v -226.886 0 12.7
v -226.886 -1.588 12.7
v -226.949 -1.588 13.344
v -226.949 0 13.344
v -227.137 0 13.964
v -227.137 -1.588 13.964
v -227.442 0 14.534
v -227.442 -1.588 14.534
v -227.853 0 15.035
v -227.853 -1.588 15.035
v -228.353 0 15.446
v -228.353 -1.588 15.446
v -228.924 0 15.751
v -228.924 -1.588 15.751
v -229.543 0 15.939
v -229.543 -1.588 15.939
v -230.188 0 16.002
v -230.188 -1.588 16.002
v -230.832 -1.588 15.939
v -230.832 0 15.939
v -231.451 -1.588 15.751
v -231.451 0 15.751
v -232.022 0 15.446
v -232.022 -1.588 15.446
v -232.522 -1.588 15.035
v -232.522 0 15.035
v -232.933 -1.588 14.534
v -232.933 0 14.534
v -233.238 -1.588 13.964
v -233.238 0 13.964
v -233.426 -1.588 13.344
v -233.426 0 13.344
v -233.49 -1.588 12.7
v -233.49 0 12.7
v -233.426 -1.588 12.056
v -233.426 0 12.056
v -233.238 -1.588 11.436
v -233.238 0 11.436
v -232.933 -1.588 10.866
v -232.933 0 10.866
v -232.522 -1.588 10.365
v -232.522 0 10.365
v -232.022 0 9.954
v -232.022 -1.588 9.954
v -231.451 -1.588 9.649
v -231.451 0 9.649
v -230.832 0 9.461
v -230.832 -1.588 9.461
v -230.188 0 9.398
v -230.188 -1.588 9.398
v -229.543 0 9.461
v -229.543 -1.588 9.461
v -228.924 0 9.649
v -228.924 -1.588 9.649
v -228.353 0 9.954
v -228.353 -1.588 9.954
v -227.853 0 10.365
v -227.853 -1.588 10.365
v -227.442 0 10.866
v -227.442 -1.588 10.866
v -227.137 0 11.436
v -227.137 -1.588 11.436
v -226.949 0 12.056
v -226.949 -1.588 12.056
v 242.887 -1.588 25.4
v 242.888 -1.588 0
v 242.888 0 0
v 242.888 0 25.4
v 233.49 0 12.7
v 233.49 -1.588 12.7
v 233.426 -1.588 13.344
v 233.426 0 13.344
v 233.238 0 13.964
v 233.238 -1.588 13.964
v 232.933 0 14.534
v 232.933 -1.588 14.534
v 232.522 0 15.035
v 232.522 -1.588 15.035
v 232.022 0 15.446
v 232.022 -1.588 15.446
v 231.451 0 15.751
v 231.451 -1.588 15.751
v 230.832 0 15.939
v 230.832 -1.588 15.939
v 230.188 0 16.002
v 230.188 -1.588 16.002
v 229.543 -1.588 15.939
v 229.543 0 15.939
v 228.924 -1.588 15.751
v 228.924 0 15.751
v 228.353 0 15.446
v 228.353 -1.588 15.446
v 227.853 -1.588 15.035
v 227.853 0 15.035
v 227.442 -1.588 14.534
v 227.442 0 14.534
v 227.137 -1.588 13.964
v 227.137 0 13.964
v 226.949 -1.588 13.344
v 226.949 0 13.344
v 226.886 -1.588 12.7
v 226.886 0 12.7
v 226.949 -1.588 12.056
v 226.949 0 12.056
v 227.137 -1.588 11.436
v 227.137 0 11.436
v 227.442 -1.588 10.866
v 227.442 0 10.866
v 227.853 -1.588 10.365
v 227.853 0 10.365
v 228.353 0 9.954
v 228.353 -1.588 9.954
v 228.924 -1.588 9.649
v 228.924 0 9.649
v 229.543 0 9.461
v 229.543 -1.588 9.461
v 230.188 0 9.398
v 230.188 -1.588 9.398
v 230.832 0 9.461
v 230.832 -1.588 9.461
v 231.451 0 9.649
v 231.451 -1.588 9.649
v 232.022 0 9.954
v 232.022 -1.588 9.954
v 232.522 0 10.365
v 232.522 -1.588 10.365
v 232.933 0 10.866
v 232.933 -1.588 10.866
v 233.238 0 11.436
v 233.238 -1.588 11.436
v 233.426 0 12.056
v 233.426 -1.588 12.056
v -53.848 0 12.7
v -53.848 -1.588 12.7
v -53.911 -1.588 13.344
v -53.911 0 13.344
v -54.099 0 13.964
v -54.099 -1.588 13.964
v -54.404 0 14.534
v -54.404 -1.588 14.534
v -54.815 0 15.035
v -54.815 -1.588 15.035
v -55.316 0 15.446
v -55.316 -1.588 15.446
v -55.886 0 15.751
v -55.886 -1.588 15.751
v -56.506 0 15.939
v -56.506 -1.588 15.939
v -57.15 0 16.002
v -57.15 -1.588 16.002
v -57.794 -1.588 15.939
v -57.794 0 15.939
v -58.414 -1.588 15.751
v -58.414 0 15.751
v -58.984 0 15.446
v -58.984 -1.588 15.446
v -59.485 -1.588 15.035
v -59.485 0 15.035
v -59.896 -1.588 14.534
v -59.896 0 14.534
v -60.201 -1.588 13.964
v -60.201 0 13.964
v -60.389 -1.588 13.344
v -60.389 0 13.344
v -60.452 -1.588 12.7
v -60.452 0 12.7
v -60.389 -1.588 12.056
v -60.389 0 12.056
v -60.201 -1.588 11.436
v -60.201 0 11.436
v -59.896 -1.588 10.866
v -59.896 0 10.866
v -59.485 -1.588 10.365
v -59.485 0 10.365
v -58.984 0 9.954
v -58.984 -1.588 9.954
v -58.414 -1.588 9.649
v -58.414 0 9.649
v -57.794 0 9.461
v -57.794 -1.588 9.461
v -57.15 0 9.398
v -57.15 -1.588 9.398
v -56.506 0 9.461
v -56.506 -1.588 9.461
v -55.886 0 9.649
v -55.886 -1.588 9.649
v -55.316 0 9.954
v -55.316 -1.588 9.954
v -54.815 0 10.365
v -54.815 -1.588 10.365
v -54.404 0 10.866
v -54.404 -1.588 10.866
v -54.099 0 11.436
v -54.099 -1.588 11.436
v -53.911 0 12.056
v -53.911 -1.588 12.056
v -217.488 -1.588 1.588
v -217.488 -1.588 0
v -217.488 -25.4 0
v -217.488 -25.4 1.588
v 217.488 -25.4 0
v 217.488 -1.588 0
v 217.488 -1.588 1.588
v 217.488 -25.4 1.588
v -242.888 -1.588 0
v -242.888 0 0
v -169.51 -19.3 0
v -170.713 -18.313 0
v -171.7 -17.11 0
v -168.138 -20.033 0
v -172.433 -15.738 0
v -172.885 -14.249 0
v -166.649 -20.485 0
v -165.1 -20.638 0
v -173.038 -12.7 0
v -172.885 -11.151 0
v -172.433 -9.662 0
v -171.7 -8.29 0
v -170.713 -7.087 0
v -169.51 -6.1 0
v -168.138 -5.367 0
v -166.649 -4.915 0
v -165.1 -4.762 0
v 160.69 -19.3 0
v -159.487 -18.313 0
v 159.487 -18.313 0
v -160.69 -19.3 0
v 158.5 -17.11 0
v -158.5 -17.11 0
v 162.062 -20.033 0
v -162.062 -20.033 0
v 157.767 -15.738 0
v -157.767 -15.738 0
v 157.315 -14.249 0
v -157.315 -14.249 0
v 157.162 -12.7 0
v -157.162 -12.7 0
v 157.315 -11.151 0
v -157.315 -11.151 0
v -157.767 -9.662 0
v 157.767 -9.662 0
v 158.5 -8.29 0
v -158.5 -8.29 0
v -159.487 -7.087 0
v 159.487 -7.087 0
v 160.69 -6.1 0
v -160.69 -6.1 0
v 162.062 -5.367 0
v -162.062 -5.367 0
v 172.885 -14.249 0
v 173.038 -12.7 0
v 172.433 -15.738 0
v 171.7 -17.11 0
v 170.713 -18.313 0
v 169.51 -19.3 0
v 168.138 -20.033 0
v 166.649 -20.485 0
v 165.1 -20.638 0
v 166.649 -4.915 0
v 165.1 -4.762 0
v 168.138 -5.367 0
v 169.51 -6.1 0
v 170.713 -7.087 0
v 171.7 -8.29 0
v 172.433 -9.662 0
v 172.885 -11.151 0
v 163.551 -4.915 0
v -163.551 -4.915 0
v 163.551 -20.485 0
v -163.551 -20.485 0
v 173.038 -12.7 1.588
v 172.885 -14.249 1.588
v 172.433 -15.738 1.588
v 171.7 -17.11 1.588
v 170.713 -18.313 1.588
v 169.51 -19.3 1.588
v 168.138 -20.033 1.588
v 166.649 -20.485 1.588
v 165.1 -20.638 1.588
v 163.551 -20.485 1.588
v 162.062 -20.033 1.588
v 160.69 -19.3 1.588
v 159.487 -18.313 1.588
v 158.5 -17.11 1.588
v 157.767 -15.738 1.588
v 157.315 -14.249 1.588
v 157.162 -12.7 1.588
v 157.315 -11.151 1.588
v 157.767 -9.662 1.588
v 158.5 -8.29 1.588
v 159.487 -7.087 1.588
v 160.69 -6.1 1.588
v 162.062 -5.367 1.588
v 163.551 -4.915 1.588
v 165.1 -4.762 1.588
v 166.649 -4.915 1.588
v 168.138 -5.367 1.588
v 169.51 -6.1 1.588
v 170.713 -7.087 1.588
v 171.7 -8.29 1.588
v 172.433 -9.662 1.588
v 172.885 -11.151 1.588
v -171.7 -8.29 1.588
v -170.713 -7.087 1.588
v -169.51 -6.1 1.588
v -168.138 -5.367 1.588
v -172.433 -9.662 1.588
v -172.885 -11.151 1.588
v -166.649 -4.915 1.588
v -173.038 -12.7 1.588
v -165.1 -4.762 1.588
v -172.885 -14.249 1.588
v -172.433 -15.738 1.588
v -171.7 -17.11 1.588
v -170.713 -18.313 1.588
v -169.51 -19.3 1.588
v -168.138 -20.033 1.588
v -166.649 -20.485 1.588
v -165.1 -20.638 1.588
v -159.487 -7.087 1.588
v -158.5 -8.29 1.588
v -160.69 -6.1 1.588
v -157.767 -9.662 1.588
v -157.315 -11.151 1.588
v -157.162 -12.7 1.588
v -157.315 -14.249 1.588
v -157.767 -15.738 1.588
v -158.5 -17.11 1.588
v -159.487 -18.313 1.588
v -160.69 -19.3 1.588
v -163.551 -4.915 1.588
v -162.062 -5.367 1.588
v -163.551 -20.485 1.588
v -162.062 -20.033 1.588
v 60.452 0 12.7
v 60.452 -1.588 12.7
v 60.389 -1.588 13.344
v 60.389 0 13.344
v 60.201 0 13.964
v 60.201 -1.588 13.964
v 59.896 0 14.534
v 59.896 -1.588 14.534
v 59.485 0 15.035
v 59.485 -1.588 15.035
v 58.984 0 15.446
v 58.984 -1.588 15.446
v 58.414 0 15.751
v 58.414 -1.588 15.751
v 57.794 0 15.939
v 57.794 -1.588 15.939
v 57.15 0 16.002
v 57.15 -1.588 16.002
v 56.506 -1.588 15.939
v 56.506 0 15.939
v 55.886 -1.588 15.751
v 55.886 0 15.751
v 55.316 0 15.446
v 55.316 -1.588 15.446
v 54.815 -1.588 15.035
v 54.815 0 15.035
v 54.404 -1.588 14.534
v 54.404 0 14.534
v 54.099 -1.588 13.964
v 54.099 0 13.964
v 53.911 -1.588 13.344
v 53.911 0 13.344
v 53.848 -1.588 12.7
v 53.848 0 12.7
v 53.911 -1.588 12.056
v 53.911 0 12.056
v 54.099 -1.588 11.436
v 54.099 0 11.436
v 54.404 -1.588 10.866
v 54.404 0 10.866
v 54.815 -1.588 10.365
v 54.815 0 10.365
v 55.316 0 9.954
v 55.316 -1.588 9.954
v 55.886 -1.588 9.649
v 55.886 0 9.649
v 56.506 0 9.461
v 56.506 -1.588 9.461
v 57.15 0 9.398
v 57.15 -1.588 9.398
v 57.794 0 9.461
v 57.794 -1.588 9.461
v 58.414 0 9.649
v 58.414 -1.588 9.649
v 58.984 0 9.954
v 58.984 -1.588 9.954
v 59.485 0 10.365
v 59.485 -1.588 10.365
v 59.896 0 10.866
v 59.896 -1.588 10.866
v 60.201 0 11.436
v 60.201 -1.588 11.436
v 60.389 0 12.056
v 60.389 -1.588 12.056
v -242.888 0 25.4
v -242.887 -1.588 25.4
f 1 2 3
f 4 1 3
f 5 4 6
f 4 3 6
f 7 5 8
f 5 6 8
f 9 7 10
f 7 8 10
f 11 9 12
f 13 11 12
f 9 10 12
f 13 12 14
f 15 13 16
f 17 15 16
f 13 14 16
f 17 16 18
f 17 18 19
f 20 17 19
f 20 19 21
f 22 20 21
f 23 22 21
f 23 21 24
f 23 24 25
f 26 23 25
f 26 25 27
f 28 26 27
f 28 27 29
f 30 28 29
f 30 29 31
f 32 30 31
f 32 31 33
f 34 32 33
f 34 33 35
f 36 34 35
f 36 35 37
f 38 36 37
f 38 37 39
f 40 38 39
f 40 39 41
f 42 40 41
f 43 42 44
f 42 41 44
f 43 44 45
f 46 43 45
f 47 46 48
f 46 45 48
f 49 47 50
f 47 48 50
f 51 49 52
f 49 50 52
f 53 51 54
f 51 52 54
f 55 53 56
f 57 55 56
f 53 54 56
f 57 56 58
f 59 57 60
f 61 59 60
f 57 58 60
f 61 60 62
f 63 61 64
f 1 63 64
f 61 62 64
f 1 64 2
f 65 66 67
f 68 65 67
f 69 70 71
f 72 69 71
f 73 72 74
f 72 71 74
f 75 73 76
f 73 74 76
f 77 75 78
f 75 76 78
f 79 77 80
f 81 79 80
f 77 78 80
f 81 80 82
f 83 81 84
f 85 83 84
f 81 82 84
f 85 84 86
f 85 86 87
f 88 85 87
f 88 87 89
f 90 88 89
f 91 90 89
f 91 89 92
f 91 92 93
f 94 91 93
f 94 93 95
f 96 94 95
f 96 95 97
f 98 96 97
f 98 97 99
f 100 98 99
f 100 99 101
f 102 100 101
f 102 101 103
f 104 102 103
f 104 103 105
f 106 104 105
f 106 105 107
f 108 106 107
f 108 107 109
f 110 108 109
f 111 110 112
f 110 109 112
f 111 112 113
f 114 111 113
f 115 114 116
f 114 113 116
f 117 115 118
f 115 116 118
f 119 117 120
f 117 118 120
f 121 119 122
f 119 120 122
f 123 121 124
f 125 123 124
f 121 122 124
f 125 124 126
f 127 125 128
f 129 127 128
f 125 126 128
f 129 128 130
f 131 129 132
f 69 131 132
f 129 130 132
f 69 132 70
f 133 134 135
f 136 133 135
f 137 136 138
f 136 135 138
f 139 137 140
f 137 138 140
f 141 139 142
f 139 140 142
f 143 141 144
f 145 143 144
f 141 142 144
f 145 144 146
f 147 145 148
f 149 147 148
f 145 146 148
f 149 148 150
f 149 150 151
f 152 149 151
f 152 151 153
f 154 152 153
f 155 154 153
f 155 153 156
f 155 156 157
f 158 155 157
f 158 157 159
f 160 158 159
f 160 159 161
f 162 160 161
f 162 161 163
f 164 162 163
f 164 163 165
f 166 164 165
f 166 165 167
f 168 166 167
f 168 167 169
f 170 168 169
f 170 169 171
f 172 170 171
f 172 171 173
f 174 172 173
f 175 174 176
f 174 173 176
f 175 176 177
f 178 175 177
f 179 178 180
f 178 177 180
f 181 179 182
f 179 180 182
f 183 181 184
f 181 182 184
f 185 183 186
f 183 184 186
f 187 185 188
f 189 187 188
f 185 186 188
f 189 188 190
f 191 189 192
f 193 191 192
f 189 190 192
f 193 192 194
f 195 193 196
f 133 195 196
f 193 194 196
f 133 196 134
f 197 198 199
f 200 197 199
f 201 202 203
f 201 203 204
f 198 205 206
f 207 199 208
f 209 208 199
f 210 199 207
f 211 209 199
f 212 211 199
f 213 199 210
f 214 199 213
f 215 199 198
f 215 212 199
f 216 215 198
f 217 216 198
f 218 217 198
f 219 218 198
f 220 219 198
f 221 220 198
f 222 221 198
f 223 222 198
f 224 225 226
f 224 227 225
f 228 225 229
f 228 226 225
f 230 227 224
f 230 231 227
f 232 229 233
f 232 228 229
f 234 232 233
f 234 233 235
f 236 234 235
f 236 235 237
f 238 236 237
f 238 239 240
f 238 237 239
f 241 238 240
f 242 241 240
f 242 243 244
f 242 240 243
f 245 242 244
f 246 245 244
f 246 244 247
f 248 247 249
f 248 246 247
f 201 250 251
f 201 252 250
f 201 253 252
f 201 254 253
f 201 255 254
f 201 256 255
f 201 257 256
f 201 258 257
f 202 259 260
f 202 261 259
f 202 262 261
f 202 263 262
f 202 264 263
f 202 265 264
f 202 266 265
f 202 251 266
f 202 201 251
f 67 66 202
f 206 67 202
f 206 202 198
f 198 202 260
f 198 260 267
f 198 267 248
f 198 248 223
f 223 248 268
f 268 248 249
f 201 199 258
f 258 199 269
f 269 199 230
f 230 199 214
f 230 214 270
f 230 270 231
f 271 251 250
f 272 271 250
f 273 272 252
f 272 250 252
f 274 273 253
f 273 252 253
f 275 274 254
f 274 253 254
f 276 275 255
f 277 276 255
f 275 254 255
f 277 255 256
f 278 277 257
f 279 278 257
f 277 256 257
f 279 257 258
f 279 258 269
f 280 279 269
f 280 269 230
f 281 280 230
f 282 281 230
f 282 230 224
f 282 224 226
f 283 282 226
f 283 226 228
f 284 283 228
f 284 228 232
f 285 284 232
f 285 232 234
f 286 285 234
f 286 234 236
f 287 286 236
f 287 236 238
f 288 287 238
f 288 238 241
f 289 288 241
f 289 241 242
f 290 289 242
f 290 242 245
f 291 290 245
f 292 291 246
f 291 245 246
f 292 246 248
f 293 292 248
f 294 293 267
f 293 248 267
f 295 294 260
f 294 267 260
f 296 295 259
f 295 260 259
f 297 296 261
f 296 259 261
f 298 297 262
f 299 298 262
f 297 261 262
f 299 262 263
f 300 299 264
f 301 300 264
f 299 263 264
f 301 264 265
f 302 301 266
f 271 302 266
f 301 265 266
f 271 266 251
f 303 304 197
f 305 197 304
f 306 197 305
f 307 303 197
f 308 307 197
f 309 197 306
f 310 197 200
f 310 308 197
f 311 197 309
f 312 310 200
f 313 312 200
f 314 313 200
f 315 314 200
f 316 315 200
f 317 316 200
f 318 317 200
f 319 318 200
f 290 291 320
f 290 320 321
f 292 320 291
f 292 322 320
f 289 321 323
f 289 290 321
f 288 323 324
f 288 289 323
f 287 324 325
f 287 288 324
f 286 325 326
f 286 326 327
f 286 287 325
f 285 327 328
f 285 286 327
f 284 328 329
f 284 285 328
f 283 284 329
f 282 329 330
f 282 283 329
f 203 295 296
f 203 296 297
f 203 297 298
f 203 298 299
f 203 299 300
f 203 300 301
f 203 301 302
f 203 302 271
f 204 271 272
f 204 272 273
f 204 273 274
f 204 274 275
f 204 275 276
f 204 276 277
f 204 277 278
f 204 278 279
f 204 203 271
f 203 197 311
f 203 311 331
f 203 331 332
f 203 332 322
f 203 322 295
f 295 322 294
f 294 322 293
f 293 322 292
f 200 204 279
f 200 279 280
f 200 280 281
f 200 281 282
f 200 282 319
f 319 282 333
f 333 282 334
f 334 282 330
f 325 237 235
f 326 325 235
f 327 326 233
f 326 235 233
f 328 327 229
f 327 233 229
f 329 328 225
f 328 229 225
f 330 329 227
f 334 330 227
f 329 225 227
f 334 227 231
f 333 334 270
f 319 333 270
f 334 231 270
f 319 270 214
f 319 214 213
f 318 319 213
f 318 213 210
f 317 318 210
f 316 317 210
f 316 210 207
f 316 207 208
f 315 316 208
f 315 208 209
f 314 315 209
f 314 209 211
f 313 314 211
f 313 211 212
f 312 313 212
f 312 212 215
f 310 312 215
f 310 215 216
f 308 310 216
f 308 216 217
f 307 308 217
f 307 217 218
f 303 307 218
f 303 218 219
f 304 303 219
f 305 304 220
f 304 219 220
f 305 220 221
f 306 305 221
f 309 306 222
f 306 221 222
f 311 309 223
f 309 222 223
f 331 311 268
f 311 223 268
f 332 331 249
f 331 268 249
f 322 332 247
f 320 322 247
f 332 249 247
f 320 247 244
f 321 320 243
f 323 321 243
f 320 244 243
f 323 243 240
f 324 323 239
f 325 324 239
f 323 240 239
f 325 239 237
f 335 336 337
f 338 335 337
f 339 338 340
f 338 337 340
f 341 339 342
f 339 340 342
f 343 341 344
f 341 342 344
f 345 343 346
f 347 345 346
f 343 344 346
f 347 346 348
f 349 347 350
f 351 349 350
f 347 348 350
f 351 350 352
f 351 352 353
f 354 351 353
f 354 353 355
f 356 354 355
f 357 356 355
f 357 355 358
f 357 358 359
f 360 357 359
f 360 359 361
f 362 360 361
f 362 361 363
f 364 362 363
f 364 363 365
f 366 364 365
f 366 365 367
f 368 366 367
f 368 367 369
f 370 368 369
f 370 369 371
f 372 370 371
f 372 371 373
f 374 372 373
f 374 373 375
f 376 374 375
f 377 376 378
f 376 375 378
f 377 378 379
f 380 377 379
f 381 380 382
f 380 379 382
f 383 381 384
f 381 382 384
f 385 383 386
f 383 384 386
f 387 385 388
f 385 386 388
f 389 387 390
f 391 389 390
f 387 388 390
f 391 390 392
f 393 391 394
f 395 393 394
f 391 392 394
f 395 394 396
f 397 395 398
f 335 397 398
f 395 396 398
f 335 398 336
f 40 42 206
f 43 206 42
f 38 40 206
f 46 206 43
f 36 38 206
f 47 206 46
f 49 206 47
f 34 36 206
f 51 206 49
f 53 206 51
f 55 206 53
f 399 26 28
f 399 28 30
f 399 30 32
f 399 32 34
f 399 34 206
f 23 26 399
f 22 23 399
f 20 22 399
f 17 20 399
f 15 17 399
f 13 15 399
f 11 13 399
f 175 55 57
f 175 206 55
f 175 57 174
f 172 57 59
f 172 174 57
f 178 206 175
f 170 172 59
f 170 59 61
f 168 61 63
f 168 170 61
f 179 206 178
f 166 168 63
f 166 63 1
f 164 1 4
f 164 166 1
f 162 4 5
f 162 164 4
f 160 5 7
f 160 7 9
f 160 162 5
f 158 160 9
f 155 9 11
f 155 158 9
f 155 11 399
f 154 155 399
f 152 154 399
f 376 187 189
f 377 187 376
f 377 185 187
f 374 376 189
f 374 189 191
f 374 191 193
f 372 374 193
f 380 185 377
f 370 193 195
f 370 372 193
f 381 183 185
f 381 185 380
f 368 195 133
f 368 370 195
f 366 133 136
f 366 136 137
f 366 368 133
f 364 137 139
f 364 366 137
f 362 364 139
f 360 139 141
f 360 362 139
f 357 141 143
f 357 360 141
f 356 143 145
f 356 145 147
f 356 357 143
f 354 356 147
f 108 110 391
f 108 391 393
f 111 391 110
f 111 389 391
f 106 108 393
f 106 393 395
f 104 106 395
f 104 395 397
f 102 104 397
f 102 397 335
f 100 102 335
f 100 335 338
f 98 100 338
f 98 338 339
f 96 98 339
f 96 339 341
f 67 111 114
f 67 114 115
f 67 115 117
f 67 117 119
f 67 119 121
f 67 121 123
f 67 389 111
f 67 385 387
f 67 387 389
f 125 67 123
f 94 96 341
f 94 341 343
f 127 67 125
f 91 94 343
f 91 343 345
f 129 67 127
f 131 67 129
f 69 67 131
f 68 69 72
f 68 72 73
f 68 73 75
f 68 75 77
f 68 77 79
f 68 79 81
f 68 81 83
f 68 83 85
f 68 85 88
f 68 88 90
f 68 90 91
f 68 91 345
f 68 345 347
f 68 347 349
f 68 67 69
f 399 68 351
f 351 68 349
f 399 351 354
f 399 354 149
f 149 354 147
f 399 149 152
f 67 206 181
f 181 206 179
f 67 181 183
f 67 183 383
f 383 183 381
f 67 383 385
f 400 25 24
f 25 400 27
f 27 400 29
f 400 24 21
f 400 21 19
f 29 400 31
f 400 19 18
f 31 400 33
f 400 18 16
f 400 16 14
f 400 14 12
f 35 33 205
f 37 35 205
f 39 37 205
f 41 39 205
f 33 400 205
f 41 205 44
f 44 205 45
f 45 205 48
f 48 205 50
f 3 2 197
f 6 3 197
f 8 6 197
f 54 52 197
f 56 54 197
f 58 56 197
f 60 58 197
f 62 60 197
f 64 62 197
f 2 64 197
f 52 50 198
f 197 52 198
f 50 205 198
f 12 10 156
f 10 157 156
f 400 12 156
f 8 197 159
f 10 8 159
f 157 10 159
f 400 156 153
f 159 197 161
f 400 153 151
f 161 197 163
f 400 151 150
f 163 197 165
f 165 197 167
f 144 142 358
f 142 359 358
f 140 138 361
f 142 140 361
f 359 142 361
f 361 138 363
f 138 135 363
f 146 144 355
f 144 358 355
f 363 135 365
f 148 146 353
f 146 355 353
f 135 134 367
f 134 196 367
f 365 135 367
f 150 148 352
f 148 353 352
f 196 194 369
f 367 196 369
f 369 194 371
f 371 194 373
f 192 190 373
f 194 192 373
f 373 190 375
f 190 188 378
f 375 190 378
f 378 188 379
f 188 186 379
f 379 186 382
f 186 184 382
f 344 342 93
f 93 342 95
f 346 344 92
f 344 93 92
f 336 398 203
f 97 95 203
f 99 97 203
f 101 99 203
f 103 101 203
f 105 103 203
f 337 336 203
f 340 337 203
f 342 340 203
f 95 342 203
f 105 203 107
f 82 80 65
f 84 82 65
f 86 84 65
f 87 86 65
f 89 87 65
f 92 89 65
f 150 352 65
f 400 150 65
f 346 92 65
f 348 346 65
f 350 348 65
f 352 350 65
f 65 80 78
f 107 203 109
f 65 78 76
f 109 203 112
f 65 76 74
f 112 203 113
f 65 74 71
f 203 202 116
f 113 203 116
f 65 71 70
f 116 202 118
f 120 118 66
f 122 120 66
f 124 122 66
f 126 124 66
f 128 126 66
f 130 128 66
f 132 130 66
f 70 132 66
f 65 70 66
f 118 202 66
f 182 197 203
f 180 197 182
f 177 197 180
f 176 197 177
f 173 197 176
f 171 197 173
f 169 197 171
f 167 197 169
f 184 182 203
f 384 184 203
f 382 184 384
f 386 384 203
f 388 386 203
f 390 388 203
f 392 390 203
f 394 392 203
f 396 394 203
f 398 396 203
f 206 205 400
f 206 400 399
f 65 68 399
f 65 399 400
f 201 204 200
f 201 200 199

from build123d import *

# Parameters (mm, degrees)
F1_DEPTH = 242.8875
F2_R     = 7.9375
F2_W     = 25.4
F2_H     = 23.8125
F4_DEPTH = 25.4
F3_R     = 3.302
F5_DEPTH = 25.4


with BuildPart() as f1:
    # F0 (on Right) → F1 (new body, symmetric)
    with BuildSketch(Plane.YZ):
        Polygon((0, 0), (0, 25.4), (-1.5875, 25.4), (-1.5875, 1.5875), (-25.4, 1.5875), (-25.4, 0), align=None)
    extrude(amount=F1_DEPTH, both=True)

    # F2 (on face) → F4 (cut)
    with BuildSketch(Plane(origin=(0, 0, 0), x_dir=(1, 0, 0), z_dir=(0, 0, -1))):
        with Locations((-165.1, 12.7)):
            Circle(F2_R)
        with Locations((165.1, 12.7)):
            Circle(F2_R)
        with Locations((-230.1875, 13.49375)):
            Rectangle(F2_W, F2_H)
        with Locations((230.1875, 13.49375)):
            Rectangle(F2_W, F2_H)
    extrude(amount=-F4_DEPTH, mode=Mode.SUBTRACT)

    # F3 (on face) → F5 (cut)
    with BuildSketch(Plane.XZ.offset(1.5875)):
        with Locations((-230.1875, 12.7)):
            Circle(F3_R)
        with Locations((230.1875, 12.7)):
            Circle(F3_R)
        with Locations((-57.15, 12.7)):
            Circle(F3_R)
        with Locations((57.15, 12.7)):
            Circle(F3_R)
    extrude(amount=-F5_DEPTH, mode=Mode.SUBTRACT)


solid = f1.part
